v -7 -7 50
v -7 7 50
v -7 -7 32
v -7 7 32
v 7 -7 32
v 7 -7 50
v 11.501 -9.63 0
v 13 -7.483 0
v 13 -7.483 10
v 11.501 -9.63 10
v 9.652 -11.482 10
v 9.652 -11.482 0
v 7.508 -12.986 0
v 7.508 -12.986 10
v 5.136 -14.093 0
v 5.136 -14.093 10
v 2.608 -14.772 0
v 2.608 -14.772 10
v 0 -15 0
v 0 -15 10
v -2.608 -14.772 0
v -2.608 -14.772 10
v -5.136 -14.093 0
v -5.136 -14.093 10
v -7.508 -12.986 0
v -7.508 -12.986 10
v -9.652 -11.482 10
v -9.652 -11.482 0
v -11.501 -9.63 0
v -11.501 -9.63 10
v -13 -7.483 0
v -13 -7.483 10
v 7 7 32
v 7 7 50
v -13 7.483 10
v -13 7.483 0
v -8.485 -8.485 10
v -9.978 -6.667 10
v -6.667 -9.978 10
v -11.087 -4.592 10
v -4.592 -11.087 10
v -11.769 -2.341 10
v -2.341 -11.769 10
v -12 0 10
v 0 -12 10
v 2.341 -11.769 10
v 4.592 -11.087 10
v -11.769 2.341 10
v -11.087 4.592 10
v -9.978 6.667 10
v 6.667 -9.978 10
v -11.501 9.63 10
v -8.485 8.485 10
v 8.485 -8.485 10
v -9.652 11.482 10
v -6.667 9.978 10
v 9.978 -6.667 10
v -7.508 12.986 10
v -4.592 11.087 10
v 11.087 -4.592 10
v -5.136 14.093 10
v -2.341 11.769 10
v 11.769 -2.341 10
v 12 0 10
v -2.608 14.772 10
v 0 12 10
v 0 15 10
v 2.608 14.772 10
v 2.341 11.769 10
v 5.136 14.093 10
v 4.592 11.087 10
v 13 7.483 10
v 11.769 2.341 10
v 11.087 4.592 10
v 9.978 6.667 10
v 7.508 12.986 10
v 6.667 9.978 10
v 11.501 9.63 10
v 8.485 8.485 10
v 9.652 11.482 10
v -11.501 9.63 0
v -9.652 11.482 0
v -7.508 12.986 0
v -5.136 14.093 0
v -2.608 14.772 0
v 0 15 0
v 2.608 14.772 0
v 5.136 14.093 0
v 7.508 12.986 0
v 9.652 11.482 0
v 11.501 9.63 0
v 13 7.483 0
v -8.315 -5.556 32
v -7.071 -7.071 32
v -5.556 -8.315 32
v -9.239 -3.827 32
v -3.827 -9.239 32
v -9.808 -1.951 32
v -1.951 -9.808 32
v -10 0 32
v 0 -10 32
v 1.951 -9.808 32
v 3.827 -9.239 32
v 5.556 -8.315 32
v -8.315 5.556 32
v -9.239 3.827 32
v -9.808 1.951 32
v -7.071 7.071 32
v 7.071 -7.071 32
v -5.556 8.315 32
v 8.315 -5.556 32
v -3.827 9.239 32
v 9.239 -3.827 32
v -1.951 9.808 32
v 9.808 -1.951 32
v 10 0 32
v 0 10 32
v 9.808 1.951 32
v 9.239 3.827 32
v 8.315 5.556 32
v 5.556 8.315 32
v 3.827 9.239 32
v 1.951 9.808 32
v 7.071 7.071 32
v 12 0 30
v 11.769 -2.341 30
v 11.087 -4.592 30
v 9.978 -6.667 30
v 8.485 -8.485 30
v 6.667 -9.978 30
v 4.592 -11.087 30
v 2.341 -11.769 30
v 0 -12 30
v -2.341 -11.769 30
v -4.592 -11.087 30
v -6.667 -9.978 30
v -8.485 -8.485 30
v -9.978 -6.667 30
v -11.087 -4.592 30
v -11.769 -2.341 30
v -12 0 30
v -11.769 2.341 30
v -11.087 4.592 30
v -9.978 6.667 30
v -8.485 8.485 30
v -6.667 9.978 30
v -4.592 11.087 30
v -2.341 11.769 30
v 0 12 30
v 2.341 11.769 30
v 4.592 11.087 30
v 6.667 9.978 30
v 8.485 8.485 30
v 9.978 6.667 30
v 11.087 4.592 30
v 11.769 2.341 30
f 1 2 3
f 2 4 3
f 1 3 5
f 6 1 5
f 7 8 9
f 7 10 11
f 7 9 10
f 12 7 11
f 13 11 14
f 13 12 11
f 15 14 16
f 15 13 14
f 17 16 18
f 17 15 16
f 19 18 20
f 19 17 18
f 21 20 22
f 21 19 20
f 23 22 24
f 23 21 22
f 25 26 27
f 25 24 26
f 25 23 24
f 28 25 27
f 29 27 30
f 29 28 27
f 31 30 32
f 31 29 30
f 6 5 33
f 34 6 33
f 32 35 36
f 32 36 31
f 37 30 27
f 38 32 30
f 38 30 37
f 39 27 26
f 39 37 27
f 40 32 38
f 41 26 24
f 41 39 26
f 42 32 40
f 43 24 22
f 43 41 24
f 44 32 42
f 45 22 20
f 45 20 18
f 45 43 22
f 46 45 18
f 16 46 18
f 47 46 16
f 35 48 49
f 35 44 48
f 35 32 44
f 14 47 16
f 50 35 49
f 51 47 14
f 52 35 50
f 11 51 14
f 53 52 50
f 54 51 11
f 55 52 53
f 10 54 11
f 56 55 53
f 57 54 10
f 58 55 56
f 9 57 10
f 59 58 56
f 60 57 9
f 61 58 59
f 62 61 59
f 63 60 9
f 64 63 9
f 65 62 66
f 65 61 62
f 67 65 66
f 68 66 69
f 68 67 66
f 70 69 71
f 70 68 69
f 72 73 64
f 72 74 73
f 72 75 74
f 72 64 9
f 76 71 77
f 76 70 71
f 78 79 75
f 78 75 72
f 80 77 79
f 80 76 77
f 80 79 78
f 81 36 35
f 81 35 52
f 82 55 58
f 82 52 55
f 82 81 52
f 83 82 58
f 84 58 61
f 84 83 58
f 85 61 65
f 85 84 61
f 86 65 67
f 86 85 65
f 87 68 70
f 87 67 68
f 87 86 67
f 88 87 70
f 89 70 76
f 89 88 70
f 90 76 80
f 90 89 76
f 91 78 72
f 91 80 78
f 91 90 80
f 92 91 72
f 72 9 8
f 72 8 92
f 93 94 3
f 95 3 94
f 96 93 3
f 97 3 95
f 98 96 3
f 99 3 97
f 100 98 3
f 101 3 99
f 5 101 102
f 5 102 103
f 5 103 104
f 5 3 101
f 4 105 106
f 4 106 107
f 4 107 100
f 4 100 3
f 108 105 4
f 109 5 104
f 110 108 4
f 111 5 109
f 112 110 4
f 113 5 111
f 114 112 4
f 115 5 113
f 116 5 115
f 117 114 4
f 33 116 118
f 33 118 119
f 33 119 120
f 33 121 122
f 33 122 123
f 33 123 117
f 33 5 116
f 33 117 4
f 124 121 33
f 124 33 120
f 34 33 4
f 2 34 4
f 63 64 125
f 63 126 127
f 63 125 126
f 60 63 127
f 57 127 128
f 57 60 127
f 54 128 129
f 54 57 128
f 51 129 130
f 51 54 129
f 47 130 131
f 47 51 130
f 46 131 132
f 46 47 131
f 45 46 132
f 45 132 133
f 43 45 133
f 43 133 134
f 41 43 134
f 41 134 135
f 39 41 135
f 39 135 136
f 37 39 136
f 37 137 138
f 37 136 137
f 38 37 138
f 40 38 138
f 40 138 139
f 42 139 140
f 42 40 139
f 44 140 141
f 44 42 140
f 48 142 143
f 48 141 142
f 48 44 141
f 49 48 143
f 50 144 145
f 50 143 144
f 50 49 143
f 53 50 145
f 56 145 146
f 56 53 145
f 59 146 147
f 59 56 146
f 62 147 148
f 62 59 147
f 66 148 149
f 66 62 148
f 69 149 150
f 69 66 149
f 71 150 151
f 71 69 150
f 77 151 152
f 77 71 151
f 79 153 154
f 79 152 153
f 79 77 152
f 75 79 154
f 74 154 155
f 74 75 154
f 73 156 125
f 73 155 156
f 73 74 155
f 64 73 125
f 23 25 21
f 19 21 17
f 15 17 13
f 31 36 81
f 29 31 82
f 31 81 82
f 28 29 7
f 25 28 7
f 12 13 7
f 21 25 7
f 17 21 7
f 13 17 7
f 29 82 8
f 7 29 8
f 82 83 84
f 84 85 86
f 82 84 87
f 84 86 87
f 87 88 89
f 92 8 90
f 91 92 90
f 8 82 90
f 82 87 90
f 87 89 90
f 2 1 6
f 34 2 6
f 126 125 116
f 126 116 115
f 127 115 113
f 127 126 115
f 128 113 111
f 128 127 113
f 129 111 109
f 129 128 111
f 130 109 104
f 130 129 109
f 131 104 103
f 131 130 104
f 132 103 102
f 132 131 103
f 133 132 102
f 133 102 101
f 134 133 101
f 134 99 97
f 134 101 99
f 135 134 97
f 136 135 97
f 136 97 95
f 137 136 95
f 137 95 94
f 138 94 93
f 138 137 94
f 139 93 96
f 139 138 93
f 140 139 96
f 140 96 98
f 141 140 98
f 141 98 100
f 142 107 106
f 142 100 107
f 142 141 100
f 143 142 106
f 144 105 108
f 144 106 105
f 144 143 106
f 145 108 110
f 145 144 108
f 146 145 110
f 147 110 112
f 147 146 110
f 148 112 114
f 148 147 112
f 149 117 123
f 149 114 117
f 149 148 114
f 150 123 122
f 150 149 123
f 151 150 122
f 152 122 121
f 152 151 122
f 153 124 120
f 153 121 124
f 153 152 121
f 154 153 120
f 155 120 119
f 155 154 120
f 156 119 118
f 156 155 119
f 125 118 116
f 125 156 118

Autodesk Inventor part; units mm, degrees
ref_plane "YZ Plane" through (0, 0, 0) normal (1, 0, 0) x (0, 1, 0)
ref_plane "XZ Plane" through (0, 0, 0) normal (0, 1, 0) x (-1, 0, 0)
ref_plane "XY Plane" through (0, 0, 0) normal (0, 0, 1) x (1, 0, 0)
sketch "Sketch1" plane through (0, 0, 0) normal (0, 0, 1) x (1, 0, 0)
  circle A0 centre (0, 0) radius 15
  dimension "d0" = 30
extrude "Extrusion1" add sketch "Sketch1" along normal blind 10
sketch "Sketch2" plane through (0, 0, 10) normal (0, 0, 1) x (1, 0, 0)
  line L0 (-13, -20) -> (13, -20)
  line L1 (13, -20) -> (13, 20)
  line L2 (13, 20) -> (-13, 20)
  line L3 (-13, 20) -> (-13, -20)
  line L4 (-13, -20) -> (13, 20) construction
  line L5 (13, -20) -> (-13, 20) construction
  point P0 (0, 0)
  dimension "d3" = 26
  dimension "d4" = 40
extrude "Extrusion2" cut sketch "Sketch2" against normal blind 10 keep common part
sketch "Sketch3" plane through (0, 0, 10) normal (0, 0, 1) x (1, 0, 0)
  circle A0 centre (0, 0) radius 12
  dimension "d7" = 24
extrude "Extrusion3" add sketch "Sketch3" along normal blind 22
chamfer "Chamfer1" distance 2 angle 45 1 edges at (-12, 0, 32)
sketch "Sketch4" plane through (0, 0, 32) normal (0, 0, 1) x (1, 0, 0)
  line L0 (-7, -7) -> (7, -7)
  line L1 (7, -7) -> (7, 7)
  line L2 (7, 7) -> (-7, 7)
  line L3 (-7, 7) -> (-7, -7)
  line L4 (-7, -7) -> (7, 7) construction
  line L5 (7, -7) -> (-7, 7) construction
  point P0 (0, 0)
  dimension "d13" = 14
extrude "Extrusion4" add sketch "Sketch4" along normal blind 18
thread "Thread1" size "TR24x3" class "7e" standard "ISO Metric Trapezoidal Threads" full length
properties part number "lab10_2"
